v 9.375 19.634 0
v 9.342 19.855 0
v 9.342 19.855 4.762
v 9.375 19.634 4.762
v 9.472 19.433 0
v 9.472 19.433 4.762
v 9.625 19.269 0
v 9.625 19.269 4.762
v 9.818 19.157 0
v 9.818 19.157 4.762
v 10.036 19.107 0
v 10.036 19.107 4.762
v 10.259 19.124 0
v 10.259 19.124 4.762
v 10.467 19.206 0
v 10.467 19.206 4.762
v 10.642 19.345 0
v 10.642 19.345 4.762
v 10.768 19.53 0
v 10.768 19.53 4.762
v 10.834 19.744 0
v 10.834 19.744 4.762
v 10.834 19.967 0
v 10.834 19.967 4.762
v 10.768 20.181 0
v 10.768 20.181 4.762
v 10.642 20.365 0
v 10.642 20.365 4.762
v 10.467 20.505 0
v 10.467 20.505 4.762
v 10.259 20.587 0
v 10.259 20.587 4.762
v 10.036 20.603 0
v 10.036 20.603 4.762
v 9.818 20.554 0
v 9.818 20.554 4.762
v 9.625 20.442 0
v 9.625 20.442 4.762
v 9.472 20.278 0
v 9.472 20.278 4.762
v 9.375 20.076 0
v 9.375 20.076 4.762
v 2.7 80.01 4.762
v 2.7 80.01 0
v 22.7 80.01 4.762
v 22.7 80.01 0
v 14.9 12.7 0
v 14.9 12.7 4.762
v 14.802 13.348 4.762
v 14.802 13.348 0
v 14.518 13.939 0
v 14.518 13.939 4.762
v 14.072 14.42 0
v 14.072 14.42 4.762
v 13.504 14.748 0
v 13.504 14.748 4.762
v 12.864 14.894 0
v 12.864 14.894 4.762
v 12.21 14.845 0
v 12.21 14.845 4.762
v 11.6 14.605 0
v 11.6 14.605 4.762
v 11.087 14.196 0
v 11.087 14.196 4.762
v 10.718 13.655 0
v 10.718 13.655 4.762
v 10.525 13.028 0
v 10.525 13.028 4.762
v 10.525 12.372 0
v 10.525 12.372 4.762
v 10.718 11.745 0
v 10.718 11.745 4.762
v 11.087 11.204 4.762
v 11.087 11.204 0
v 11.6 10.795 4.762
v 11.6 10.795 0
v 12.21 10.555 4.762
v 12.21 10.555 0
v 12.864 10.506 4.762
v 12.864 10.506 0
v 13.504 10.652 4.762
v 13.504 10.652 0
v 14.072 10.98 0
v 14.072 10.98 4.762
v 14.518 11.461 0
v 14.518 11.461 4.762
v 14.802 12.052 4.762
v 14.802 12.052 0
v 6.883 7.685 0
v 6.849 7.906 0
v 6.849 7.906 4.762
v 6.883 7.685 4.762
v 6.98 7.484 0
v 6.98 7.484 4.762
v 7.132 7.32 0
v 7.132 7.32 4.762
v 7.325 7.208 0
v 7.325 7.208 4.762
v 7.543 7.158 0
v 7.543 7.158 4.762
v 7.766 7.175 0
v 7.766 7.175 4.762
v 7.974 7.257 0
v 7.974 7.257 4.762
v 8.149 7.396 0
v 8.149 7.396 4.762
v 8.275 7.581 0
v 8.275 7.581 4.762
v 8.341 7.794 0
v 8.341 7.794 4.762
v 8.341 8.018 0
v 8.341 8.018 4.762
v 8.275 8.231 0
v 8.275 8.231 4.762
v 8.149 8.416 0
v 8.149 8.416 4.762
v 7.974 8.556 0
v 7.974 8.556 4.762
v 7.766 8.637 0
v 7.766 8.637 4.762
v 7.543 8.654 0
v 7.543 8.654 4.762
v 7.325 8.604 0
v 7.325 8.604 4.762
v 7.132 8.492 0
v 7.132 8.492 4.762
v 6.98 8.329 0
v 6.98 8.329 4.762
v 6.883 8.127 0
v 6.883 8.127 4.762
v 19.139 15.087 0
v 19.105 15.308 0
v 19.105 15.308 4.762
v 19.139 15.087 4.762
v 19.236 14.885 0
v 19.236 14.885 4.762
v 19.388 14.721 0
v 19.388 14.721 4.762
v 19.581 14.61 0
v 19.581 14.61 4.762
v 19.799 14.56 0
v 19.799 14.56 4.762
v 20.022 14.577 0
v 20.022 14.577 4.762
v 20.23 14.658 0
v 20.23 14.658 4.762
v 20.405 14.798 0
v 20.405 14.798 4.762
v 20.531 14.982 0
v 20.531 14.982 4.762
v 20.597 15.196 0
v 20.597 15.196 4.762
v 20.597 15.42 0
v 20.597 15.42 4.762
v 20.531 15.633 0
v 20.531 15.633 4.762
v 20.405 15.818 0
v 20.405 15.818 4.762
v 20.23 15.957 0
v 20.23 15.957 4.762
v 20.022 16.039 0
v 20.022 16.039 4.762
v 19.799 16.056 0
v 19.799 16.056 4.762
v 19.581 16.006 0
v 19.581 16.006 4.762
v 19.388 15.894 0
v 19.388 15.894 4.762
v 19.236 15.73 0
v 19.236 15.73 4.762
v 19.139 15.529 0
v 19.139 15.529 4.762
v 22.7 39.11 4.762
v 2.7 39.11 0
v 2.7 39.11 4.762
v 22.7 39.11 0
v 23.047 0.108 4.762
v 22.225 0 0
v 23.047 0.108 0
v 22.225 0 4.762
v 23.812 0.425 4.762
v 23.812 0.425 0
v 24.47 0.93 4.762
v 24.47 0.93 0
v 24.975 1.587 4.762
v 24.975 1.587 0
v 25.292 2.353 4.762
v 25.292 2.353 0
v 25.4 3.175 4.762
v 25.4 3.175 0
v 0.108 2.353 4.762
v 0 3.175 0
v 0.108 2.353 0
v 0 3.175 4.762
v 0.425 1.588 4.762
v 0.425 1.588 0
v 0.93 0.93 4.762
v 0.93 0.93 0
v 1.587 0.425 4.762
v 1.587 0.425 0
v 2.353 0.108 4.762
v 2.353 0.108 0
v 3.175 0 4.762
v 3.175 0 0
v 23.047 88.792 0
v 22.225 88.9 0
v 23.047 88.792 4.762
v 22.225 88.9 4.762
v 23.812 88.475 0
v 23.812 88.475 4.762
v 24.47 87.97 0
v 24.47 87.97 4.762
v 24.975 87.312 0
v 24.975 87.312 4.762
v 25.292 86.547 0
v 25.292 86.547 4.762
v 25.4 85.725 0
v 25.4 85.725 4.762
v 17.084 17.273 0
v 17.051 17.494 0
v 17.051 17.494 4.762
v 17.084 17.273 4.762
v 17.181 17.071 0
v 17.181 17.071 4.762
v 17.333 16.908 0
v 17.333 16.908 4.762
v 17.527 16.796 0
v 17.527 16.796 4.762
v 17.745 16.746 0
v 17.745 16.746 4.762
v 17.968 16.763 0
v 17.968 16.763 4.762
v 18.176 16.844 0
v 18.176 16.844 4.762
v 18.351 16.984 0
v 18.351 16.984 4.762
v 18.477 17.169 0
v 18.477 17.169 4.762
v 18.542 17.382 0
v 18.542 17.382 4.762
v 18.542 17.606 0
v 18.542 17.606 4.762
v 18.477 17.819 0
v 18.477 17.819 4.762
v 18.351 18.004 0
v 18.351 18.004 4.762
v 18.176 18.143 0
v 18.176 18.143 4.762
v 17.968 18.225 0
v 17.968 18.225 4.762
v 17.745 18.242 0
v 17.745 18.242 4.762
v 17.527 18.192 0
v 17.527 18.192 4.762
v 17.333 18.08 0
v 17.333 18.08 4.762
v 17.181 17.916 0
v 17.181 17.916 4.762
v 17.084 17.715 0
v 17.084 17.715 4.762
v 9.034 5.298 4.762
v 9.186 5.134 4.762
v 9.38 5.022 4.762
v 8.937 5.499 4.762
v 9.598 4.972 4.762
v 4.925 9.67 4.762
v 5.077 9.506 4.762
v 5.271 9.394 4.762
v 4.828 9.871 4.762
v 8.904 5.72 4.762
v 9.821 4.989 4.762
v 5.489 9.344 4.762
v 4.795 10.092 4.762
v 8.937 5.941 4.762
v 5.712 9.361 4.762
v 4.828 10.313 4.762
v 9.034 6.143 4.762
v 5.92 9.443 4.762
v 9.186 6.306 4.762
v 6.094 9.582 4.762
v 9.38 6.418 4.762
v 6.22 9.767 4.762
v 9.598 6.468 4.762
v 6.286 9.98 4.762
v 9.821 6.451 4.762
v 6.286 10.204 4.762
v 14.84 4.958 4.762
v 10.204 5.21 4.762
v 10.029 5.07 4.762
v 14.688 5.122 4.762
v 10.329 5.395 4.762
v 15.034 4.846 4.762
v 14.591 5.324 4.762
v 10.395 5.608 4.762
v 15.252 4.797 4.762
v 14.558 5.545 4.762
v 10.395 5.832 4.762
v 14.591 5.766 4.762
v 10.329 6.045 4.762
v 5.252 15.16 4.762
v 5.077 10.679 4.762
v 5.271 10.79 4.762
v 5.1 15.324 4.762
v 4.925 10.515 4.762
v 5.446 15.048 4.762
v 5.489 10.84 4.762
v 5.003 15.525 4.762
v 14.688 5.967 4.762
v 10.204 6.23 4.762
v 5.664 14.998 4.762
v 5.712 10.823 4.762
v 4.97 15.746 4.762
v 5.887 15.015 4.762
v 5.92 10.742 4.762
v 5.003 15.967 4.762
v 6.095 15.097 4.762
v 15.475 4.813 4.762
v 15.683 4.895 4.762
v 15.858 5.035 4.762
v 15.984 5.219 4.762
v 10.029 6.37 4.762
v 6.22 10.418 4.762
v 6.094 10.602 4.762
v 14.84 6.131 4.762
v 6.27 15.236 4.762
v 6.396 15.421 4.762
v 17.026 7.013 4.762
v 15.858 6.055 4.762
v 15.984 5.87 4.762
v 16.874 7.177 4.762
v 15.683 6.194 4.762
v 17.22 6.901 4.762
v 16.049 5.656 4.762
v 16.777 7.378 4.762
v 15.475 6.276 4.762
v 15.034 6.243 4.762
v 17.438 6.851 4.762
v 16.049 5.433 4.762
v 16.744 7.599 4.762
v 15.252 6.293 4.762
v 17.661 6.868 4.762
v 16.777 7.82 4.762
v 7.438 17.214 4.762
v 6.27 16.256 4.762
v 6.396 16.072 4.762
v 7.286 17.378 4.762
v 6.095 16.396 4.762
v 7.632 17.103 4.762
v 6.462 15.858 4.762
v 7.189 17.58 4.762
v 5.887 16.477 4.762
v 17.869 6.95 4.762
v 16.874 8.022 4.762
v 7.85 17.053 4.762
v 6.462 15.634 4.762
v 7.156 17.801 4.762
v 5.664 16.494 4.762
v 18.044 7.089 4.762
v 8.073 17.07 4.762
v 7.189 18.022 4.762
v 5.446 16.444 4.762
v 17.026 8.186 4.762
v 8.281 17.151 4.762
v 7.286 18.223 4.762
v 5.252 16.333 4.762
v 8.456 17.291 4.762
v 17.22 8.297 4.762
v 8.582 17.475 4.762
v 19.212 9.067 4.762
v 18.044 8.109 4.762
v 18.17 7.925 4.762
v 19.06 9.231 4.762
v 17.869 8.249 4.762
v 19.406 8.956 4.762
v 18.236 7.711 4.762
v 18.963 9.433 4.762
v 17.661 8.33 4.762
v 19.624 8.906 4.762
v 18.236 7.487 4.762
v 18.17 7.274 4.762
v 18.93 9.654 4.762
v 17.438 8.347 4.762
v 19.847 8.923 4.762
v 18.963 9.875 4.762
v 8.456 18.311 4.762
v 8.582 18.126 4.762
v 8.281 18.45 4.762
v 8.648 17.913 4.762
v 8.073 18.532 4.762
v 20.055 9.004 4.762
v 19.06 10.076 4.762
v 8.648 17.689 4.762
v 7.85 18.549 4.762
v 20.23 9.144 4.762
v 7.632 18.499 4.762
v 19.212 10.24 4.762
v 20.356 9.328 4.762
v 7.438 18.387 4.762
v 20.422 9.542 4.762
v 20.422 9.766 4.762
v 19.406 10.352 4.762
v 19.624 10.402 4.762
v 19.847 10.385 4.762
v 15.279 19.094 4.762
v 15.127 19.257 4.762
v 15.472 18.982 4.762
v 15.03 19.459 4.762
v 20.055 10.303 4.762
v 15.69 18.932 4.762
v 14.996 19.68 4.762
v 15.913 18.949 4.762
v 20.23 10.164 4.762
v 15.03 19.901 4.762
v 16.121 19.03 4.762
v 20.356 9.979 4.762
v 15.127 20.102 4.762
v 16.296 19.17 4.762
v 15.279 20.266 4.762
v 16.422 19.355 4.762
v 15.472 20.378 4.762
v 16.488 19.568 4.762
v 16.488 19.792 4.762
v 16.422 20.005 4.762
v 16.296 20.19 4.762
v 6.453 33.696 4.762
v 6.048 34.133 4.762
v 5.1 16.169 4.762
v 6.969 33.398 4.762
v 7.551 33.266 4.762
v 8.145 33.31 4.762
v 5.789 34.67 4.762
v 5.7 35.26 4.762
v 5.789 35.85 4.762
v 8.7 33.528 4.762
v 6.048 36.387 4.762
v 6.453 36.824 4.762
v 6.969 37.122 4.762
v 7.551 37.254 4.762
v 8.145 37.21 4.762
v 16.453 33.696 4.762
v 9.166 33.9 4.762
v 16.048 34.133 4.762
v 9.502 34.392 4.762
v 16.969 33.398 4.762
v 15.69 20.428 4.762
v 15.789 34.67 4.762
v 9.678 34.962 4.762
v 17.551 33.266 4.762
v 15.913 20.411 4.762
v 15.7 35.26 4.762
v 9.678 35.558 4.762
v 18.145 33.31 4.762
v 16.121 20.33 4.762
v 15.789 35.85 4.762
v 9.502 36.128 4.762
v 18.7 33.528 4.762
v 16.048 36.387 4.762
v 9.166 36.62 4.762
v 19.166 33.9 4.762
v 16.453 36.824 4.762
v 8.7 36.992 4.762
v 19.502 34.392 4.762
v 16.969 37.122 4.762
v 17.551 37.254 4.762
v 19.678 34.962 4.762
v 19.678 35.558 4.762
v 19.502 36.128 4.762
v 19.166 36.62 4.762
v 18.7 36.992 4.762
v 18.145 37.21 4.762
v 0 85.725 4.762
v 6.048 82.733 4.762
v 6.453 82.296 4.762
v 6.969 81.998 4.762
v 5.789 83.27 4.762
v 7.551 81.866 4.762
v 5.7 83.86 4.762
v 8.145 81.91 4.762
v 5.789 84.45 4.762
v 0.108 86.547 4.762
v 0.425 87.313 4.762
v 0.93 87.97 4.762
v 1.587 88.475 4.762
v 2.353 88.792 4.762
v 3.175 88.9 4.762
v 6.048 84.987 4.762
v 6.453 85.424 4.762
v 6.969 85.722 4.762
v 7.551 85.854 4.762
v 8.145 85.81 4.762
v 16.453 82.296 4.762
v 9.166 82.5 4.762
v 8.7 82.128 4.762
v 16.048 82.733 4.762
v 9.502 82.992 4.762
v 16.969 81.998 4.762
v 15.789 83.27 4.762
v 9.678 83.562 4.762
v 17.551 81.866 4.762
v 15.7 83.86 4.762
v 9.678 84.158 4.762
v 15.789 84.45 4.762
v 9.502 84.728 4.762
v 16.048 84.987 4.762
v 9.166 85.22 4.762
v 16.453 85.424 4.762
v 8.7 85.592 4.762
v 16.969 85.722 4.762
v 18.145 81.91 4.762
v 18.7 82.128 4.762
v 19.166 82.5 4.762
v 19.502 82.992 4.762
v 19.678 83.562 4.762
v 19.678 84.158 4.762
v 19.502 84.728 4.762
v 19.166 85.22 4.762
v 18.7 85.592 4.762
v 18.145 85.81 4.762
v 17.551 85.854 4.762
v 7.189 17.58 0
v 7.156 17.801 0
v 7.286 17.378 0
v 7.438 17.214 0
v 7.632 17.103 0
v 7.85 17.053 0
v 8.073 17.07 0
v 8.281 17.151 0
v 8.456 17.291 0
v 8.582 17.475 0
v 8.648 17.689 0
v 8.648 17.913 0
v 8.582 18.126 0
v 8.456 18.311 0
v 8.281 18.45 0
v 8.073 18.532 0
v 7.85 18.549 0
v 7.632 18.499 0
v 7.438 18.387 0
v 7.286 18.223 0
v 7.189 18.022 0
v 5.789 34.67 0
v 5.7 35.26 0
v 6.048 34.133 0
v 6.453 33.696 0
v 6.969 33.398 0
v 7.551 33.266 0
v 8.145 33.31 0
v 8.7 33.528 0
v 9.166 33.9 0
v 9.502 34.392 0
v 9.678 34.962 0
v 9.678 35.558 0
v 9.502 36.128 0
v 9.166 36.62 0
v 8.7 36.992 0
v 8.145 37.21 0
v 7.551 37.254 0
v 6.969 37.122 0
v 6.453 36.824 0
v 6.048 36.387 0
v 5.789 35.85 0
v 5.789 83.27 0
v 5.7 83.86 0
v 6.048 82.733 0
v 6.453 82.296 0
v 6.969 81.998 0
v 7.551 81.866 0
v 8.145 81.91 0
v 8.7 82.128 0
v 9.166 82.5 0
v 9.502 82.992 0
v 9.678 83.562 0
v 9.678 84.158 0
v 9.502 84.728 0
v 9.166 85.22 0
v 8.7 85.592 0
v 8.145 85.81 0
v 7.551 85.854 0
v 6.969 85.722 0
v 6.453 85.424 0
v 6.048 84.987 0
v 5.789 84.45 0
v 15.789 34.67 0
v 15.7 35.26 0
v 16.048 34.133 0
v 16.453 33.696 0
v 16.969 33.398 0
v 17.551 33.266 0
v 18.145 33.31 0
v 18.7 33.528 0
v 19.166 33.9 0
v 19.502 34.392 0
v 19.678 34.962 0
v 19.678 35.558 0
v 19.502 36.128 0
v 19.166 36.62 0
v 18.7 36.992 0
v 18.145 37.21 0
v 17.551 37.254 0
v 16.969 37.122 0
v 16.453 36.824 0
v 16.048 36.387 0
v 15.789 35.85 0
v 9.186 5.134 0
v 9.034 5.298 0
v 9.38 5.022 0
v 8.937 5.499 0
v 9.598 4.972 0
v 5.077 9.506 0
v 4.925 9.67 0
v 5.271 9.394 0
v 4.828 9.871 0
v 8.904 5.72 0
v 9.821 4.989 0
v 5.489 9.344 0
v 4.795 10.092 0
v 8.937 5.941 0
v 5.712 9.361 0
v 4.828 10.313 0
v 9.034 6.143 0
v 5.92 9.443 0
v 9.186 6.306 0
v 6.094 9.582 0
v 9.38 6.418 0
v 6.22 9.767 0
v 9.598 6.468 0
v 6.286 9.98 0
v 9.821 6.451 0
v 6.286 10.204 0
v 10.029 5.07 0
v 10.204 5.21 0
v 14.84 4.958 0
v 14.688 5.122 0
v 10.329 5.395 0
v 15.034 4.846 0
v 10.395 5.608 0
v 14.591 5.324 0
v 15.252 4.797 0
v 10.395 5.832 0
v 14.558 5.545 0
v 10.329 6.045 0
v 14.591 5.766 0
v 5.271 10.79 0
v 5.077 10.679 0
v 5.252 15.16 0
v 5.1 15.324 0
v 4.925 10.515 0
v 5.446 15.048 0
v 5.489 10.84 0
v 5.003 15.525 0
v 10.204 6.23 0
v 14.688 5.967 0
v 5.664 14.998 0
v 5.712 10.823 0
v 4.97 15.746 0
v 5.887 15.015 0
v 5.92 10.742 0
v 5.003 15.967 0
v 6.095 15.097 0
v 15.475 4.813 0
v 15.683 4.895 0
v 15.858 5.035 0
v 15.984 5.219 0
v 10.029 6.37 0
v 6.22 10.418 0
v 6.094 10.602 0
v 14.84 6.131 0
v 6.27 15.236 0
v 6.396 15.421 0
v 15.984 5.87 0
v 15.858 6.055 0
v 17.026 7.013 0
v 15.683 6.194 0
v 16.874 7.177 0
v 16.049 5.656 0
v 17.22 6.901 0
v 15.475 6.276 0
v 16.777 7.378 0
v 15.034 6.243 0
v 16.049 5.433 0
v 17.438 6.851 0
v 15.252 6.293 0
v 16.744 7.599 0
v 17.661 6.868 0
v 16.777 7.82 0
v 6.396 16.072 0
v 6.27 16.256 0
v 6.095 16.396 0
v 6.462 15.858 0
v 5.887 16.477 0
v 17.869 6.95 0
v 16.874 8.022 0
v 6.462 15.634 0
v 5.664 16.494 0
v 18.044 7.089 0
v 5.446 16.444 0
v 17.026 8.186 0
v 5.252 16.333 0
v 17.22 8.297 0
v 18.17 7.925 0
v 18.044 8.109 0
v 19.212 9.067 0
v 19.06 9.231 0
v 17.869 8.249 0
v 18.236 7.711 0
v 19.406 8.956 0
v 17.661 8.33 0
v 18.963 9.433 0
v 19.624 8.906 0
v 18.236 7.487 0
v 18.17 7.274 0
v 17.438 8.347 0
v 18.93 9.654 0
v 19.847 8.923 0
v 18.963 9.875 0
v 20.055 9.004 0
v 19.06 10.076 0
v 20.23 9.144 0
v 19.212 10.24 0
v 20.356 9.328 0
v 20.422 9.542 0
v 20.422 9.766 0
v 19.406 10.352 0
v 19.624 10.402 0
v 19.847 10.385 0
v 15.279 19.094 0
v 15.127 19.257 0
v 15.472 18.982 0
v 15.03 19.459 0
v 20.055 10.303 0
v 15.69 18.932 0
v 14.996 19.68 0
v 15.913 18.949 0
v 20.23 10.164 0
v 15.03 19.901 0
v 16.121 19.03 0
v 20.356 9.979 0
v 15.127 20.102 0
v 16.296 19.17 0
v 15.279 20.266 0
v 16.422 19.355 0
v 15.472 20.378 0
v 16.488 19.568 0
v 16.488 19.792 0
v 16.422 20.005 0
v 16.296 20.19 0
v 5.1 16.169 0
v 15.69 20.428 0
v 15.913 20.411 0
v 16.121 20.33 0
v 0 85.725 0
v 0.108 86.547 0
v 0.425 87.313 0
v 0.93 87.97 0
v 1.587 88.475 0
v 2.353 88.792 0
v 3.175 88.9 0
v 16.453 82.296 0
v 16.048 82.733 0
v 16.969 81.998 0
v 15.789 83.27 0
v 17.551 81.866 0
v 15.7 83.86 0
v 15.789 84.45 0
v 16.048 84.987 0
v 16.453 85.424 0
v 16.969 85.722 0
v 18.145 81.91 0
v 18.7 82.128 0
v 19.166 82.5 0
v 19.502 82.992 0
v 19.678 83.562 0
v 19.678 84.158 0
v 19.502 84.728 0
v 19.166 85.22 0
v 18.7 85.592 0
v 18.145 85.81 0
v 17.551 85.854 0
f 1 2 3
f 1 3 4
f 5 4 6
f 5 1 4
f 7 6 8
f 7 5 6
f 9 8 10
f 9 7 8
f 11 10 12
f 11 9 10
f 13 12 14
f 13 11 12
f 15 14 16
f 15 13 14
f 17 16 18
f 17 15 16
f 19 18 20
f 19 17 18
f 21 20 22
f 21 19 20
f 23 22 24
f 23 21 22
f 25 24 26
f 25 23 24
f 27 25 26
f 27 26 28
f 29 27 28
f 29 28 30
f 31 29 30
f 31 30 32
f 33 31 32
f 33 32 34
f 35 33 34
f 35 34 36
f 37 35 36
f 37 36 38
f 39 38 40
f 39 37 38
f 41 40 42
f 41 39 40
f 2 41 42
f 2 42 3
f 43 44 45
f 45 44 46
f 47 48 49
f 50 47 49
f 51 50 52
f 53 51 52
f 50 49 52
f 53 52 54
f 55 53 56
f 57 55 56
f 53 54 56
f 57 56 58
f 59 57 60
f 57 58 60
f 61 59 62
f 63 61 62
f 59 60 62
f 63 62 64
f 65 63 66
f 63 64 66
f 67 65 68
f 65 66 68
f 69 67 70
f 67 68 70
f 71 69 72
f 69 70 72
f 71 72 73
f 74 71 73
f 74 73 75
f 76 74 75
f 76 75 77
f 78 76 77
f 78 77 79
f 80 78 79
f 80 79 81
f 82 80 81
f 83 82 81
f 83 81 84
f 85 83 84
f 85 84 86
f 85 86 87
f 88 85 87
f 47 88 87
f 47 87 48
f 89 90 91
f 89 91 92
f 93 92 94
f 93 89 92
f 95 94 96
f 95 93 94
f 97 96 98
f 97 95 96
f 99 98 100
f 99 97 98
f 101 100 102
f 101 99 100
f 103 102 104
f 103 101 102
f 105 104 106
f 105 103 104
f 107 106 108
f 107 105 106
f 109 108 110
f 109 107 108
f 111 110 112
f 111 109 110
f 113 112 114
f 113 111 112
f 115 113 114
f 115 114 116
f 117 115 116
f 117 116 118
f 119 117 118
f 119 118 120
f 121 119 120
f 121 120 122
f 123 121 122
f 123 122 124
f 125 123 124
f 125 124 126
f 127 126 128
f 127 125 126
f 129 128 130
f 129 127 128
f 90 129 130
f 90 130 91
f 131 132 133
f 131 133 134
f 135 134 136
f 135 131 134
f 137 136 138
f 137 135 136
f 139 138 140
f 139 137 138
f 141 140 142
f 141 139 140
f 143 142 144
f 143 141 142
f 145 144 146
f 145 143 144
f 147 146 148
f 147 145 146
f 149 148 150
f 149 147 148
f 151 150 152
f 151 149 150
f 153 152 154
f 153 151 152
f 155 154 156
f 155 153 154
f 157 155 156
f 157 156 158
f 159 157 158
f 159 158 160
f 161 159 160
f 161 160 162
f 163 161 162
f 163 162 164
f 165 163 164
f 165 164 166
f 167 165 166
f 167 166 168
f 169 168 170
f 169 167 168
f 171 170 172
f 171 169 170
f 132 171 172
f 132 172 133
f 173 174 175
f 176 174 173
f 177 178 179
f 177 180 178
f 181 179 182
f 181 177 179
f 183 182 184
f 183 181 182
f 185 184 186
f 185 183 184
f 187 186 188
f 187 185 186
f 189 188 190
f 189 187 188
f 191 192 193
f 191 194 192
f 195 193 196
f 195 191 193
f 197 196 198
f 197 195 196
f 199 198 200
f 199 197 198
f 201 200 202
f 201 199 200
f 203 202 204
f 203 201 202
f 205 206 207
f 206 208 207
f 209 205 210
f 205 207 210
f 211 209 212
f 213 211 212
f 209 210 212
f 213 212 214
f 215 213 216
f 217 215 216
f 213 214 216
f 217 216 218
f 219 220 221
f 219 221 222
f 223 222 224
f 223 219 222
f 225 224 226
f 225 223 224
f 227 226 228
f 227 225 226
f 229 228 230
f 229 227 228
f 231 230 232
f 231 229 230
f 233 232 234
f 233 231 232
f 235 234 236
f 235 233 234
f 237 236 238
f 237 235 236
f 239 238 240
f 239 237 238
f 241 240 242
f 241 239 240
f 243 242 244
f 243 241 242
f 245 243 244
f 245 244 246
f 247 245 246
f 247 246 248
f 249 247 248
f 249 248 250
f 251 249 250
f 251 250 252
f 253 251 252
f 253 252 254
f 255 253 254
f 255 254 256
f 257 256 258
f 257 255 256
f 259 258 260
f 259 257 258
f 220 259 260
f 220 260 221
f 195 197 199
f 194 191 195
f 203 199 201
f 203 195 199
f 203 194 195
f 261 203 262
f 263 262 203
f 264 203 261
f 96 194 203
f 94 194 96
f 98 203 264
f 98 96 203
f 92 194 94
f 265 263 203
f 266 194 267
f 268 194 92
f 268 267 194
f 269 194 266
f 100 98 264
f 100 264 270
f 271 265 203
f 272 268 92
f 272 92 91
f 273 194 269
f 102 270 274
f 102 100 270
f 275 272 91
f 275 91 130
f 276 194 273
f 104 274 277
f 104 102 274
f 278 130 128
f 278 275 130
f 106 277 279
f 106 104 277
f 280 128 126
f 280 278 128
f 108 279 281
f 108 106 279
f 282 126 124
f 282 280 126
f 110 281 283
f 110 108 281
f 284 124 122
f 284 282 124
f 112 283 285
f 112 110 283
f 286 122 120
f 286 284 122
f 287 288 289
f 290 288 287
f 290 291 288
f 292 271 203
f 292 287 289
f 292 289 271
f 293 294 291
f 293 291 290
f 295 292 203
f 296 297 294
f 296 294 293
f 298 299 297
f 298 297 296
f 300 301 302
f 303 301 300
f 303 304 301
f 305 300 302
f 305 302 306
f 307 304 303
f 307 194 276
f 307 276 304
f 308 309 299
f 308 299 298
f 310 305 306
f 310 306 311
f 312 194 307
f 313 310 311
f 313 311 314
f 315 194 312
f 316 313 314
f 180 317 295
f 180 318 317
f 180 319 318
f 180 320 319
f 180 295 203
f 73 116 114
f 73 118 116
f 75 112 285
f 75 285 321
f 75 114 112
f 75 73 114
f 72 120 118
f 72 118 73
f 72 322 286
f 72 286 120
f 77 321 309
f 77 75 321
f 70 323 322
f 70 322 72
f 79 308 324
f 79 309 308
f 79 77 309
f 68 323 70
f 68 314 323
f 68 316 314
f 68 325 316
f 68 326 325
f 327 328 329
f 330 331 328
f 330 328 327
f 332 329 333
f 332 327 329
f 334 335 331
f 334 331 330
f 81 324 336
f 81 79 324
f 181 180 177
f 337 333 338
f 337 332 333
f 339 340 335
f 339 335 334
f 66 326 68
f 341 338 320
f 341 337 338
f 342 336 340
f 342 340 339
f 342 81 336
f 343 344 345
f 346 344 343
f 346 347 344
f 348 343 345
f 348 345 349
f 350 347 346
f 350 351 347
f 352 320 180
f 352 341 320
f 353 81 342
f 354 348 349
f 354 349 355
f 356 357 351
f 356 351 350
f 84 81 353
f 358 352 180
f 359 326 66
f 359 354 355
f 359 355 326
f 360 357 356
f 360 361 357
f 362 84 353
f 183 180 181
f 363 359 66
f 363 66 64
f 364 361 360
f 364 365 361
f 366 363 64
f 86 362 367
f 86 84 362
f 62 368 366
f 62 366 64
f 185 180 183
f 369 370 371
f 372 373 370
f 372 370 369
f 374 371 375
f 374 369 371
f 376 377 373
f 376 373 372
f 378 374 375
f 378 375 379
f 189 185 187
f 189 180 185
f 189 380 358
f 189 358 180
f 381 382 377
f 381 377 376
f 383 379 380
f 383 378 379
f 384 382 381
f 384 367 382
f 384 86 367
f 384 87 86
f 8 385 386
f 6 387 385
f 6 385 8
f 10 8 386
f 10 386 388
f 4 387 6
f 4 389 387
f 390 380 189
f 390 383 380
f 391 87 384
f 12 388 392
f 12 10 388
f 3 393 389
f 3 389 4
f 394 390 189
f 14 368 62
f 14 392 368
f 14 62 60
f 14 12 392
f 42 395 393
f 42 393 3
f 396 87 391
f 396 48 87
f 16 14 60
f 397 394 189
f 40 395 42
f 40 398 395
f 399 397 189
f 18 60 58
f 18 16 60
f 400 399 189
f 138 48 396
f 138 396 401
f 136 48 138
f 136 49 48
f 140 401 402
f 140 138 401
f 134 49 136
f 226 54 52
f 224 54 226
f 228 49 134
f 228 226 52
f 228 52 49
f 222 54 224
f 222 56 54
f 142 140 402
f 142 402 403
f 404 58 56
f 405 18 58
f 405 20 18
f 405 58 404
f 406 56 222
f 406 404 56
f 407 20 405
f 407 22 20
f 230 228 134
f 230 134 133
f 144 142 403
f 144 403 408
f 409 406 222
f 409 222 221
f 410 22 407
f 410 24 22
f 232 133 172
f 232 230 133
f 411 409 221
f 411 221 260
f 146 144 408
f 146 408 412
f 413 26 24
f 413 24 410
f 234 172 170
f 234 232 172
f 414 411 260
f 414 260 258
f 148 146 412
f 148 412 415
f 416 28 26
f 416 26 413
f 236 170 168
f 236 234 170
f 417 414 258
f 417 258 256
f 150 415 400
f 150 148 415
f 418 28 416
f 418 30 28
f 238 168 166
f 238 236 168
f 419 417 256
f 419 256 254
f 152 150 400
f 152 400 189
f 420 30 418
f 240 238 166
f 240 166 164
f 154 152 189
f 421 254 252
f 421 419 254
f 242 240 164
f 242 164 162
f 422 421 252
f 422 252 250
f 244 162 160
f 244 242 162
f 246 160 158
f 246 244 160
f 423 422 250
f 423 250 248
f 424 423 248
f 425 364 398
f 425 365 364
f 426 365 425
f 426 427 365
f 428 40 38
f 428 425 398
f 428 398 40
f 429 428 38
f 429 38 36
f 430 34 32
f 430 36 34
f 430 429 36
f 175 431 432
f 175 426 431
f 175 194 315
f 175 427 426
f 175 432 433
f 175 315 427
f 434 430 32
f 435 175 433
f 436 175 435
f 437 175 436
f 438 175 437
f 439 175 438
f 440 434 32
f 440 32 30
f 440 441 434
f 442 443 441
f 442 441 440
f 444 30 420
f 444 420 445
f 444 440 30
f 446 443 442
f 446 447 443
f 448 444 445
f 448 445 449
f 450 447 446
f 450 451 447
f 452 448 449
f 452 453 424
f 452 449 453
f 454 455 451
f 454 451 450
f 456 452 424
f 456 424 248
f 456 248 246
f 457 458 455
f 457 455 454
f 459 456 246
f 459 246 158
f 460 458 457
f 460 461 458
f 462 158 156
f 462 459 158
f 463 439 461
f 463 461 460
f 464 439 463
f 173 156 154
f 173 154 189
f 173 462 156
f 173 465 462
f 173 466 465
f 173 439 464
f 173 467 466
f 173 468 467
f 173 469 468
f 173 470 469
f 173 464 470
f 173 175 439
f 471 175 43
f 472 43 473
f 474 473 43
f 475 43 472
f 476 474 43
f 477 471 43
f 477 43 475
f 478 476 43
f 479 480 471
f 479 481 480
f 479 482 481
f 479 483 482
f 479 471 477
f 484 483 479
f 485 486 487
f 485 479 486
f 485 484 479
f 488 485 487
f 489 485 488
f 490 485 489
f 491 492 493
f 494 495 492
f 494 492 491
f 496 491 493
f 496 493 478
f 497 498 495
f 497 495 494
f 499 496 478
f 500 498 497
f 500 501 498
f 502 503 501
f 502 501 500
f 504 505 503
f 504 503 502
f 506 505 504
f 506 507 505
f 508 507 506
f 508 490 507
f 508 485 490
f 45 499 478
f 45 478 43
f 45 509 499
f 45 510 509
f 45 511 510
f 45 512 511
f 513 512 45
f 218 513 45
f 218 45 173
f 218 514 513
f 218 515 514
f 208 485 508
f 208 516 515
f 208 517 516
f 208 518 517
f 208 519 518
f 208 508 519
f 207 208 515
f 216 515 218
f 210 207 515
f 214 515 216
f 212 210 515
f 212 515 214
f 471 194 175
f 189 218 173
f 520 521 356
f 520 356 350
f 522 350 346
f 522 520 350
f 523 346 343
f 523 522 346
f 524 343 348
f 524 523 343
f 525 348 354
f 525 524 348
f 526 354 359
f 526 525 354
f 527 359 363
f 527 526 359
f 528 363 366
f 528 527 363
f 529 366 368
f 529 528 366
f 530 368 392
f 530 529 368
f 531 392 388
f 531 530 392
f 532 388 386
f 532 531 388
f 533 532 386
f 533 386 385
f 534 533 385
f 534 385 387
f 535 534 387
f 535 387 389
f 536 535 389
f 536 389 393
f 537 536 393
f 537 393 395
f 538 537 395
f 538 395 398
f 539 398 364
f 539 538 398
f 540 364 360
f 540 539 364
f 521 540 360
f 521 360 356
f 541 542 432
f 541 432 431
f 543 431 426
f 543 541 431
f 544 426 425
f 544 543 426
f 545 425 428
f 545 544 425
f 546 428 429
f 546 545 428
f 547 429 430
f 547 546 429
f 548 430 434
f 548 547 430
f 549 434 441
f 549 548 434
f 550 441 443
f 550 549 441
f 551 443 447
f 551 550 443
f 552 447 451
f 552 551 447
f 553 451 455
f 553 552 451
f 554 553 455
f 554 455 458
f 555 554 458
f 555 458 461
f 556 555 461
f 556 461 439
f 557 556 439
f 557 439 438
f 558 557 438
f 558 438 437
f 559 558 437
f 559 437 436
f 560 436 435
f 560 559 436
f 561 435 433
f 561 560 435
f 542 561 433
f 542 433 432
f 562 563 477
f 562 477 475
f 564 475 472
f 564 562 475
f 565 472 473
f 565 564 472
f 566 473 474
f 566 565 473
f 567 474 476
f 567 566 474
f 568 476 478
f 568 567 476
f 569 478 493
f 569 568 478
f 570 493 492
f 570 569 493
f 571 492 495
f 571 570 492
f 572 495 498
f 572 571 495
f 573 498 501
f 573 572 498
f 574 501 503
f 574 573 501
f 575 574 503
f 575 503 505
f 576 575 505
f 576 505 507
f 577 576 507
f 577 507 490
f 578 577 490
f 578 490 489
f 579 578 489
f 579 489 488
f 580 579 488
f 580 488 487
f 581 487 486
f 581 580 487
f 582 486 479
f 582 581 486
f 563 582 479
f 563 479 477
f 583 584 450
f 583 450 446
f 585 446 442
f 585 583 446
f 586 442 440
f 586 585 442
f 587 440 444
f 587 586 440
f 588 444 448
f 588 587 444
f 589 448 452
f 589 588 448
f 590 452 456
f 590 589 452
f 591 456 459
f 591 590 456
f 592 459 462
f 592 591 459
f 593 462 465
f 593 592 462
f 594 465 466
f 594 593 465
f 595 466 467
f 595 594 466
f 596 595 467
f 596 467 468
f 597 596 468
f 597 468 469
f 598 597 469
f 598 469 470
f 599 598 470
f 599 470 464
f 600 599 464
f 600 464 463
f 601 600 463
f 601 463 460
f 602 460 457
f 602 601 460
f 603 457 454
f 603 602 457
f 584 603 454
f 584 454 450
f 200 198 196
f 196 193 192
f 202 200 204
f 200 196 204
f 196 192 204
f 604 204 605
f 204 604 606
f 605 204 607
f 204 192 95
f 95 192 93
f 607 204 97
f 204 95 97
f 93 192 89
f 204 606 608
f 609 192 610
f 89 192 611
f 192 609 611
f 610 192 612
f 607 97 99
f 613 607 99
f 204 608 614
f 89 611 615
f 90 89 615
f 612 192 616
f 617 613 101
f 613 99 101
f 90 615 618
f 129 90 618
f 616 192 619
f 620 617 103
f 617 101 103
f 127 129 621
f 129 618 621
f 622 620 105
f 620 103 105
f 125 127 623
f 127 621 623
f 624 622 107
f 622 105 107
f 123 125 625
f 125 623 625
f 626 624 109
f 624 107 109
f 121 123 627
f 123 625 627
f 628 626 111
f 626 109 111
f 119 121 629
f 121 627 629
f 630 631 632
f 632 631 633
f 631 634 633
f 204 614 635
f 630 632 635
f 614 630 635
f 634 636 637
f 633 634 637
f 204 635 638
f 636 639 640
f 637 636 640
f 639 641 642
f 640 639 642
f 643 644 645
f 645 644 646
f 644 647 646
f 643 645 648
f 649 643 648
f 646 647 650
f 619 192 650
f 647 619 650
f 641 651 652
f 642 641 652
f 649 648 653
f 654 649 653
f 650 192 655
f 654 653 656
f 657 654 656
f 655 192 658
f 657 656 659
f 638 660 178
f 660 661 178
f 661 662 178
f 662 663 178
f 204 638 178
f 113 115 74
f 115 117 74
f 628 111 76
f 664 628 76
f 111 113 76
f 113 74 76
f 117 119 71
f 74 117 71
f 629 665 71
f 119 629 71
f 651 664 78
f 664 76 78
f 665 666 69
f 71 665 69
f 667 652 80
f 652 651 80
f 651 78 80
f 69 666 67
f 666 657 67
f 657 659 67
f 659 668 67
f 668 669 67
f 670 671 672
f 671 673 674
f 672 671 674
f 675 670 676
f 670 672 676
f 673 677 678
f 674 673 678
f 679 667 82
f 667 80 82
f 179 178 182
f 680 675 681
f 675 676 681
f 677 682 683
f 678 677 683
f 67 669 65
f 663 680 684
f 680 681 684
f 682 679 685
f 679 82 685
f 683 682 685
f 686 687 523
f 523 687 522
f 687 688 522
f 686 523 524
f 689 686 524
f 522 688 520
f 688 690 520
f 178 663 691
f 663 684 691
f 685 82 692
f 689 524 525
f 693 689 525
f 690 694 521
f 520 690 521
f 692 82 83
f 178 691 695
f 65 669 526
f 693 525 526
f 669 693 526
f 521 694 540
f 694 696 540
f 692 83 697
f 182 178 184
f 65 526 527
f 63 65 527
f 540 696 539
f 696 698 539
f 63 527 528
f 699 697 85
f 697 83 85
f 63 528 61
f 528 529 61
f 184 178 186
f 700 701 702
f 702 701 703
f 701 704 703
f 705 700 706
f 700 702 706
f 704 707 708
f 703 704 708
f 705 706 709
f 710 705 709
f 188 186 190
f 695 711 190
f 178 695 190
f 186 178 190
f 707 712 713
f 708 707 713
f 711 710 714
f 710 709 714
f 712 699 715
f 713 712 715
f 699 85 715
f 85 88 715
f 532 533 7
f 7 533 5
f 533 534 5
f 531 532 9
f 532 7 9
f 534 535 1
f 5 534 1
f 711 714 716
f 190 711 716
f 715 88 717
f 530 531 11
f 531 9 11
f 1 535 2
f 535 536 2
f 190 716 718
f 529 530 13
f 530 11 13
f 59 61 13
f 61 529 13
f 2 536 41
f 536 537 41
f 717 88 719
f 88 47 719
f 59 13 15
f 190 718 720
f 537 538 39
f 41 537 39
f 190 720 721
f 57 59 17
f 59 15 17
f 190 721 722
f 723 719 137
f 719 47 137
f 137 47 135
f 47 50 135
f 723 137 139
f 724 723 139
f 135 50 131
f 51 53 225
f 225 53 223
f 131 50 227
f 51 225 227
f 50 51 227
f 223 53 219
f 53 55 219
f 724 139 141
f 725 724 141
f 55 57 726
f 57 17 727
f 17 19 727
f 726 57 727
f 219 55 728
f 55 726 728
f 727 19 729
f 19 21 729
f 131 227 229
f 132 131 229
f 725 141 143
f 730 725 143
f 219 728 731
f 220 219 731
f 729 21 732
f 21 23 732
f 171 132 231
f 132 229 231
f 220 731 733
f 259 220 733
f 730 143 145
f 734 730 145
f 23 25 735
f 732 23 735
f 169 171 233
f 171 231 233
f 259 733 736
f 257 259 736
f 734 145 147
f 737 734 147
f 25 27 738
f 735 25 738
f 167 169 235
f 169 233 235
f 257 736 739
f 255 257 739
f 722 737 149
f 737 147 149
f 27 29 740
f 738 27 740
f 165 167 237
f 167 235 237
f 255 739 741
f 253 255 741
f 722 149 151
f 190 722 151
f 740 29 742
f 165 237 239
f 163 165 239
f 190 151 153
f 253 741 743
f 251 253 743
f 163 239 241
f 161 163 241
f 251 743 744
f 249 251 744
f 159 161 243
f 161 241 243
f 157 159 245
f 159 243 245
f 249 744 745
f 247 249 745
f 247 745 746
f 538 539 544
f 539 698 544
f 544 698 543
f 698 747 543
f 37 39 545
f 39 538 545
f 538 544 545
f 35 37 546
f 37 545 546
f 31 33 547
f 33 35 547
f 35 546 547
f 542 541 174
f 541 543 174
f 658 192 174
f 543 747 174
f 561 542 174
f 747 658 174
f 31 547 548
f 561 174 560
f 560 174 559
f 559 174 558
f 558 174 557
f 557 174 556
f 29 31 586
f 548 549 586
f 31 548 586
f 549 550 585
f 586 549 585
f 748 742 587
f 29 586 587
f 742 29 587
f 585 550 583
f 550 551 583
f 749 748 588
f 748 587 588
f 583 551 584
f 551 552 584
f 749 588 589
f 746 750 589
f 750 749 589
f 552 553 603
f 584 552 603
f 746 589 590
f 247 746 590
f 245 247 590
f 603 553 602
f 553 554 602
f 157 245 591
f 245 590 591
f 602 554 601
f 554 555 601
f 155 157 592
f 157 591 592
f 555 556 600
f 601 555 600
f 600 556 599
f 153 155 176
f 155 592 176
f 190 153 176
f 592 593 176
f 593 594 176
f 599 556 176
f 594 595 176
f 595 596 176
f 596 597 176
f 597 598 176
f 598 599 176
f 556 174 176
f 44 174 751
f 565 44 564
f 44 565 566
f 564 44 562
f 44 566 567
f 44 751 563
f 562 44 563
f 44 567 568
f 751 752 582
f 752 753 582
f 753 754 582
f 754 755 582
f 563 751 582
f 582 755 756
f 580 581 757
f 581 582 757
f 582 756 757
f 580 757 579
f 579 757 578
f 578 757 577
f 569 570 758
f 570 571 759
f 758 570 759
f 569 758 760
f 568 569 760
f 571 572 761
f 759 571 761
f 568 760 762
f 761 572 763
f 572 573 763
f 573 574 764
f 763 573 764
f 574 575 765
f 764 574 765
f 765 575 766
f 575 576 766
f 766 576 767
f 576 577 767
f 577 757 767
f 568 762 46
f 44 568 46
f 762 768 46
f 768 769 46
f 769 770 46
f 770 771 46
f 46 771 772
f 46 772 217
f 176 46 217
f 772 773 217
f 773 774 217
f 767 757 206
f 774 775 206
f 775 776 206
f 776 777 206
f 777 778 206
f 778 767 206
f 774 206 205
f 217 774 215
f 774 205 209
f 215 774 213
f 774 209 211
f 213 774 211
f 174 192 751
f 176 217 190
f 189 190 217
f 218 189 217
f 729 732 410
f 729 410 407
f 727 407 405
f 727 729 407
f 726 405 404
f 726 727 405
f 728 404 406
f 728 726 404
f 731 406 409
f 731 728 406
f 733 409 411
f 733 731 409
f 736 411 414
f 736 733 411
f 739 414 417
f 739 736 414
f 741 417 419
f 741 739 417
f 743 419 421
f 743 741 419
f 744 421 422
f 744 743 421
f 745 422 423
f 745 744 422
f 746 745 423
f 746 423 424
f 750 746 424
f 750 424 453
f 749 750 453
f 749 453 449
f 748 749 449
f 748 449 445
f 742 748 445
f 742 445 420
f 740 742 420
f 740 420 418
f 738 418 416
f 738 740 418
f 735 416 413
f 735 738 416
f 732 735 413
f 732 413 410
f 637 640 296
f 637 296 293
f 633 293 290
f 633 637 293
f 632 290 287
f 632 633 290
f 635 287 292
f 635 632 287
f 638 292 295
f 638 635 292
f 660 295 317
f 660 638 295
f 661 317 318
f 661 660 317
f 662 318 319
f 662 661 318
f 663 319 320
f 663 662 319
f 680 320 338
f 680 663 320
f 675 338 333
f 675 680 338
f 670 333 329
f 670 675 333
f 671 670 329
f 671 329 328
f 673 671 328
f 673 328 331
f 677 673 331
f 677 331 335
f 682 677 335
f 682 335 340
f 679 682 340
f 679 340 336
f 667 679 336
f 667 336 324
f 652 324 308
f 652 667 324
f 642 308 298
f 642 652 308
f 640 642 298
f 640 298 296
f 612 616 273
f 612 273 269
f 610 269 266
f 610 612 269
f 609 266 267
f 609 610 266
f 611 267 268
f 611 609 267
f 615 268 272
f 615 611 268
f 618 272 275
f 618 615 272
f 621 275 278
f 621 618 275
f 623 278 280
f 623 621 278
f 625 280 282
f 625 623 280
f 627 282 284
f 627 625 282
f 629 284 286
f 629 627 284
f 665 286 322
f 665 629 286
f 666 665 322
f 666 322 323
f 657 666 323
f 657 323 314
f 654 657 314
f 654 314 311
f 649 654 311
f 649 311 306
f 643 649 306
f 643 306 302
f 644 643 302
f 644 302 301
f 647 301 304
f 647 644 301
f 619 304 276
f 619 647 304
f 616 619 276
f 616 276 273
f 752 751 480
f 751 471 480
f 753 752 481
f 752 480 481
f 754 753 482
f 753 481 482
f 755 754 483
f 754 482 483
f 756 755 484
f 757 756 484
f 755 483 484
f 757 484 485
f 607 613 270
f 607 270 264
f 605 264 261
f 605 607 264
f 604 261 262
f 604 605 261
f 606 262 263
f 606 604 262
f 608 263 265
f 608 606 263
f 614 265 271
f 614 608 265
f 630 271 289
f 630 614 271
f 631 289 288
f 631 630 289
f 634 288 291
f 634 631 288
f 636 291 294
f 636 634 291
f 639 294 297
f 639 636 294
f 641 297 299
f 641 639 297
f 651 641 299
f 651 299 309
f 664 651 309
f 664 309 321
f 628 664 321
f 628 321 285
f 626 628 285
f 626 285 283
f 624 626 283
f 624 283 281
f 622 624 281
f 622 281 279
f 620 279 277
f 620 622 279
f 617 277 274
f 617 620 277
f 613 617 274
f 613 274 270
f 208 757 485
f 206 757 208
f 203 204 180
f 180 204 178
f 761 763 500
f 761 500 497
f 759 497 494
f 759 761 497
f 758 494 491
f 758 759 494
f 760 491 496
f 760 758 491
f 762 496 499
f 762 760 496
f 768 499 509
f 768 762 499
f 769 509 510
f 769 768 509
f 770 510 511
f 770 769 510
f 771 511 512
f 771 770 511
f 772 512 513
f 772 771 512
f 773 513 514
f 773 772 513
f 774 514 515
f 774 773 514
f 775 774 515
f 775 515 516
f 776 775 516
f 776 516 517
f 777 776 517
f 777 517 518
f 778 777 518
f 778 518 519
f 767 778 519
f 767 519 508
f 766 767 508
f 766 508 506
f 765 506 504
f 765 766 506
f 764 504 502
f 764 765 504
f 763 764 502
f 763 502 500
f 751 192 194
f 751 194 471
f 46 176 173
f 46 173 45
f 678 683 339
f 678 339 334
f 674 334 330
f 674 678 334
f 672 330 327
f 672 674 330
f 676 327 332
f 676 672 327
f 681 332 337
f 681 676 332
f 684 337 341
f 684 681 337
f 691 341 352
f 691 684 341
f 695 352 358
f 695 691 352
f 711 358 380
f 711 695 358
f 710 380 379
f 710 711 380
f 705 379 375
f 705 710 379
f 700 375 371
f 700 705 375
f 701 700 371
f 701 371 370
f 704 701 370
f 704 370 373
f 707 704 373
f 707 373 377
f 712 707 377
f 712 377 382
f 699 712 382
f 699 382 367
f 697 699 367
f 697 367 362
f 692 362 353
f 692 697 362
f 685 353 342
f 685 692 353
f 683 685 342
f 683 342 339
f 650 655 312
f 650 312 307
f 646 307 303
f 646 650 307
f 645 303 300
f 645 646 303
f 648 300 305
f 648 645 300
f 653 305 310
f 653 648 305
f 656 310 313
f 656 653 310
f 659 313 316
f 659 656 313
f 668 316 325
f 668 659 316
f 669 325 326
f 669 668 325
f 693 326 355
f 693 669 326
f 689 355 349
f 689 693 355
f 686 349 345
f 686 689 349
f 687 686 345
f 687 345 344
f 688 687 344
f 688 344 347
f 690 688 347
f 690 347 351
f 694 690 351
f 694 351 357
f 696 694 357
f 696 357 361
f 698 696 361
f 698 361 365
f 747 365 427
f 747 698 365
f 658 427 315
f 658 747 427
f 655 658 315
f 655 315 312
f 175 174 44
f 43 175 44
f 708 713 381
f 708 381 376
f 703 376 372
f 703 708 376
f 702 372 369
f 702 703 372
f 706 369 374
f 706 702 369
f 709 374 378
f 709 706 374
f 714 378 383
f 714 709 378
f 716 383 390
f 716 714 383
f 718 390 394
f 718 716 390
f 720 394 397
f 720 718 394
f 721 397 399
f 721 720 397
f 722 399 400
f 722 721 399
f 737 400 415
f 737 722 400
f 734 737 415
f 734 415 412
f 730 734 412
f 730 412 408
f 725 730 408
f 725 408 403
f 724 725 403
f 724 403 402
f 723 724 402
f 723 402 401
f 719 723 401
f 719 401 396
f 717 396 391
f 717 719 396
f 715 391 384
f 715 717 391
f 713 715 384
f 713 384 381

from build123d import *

# Parameters (mm, degrees)
SKETCH1_W           = 25.4
SKETCH1_H           = 88.9
SKETCH1_R           = 2
SKETCH1_R_2         = 10
SKETCH1_W_2         = 20
SKETCH1_H_2         = 40.9
SKETCH1_R_3         = 1.5
SKETCH1_R_4         = 0.75
BOSS_EXTRUDE1_DEPTH = 4.7625
FILLET1_R           = 3.175
SKETCH2_R           = 2.2
CUT_EXTRUDE1_DEPTH  = 93.57997303


with BuildPart() as part:
    # Sketch1 → Boss-Extrude1 (new body)
    # profile 1 of 2: a face of its own
    with BuildSketch(Plane.XY):
        with Locations((12.7, 44.45)):
            Rectangle(SKETCH1_W, SKETCH1_H)
        with Locations(Location((17.7, 35.26, 0), (0, 0, 180))):
            Circle(SKETCH1_R, mode=Mode.SUBTRACT)
        with Locations(Location((7.7, 35.26, 0), (0, 0, 180))):
            Circle(SKETCH1_R, mode=Mode.SUBTRACT)
        with Locations(Location((17.7, 83.86, 0), (0, 0, 180))):
            Circle(SKETCH1_R, mode=Mode.SUBTRACT)
        with Locations(Location((7.7, 83.86, 0), (0, 0, 180))):
            Circle(SKETCH1_R, mode=Mode.SUBTRACT)
        with Locations((12.7, 12.7)):
            Circle(SKETCH1_R_2, mode=Mode.SUBTRACT)
        with Locations((12.7, 59.56)):
            Rectangle(SKETCH1_W_2, SKETCH1_H_2, mode=Mode.SUBTRACT)
    # profile 2 of 2: a face of its own
    with BuildSketch(Plane.XY):
        with Locations((12.7, 12.7)):
            Circle(SKETCH1_R_2)
        with Locations(Location((12.7, 12.7, 0), (0, 0, 180))):
            Circle(SKETCH1_R_3, mode=Mode.SUBTRACT)
        with Locations(Location((10.092137103, 19.855351222, 0), (0, 0, 180))):
            Circle(SKETCH1_R_4, mode=Mode.SUBTRACT)
        with Locations(Location((7.906074869, 17.80081188, 0), (0, 0, 180))):
            Circle(SKETCH1_R_4, mode=Mode.SUBTRACT)
        with Locations(Location((5.720012634, 15.746272538, 0), (0, 0, 180))):
            Circle(SKETCH1_R_4, mode=Mode.SUBTRACT)
        with Locations(Location((5.544648778, 10.092137103, 0), (0, 0, 180))):
            Circle(SKETCH1_R_4, mode=Mode.SUBTRACT)
        with Locations(Location((7.59918812, 7.906074869, 0), (0, 0, 180))):
            Circle(SKETCH1_R_4, mode=Mode.SUBTRACT)
        with Locations(Location((9.653727462, 5.720012634, 0), (0, 0, 180))):
            Circle(SKETCH1_R_4, mode=Mode.SUBTRACT)
        with Locations(Location((15.307862897, 5.544648778, 0), (0, 0, 180))):
            Circle(SKETCH1_R_4, mode=Mode.SUBTRACT)
        with Locations(Location((17.493925131, 7.59918812, 0), (0, 0, 180))):
            Circle(SKETCH1_R_4, mode=Mode.SUBTRACT)
        with Locations(Location((19.679987366, 9.653727462, 0), (0, 0, 180))):
            Circle(SKETCH1_R_4, mode=Mode.SUBTRACT)
        with Locations(Location((19.855351222, 15.307862897, 0), (0, 0, 180))):
            Circle(SKETCH1_R_4, mode=Mode.SUBTRACT)
        with Locations(Location((17.80081188, 17.493925131, 0), (0, 0, 180))):
            Circle(SKETCH1_R_4, mode=Mode.SUBTRACT)
        with Locations(Location((15.746272538, 19.679987366, 0), (0, 0, 180))):
            Circle(SKETCH1_R_4, mode=Mode.SUBTRACT)
    extrude(amount=BOSS_EXTRUDE1_DEPTH)

    # Fillet1
    fillet1_edges = [part.edges().sort_by_distance(p)[0] for p in [
        (0, 0, 2.38125),
        (0, 88.9, 2.38125),
        (25.4, 88.9, 2.38125),
        (25.4, 0, 2.38125),
    ]]
    fillet(fillet1_edges, radius=FILLET1_R)

    # Sketch2 → Cut-Extrude1 (cut, through all)
    with BuildSketch(Plane.XY.offset(4.7625)):
        with Locations((12.7, 12.7)):
            Circle(SKETCH2_R)
    extrude(amount=-CUT_EXTRUDE1_DEPTH, mode=Mode.SUBTRACT)


solid = part.part
